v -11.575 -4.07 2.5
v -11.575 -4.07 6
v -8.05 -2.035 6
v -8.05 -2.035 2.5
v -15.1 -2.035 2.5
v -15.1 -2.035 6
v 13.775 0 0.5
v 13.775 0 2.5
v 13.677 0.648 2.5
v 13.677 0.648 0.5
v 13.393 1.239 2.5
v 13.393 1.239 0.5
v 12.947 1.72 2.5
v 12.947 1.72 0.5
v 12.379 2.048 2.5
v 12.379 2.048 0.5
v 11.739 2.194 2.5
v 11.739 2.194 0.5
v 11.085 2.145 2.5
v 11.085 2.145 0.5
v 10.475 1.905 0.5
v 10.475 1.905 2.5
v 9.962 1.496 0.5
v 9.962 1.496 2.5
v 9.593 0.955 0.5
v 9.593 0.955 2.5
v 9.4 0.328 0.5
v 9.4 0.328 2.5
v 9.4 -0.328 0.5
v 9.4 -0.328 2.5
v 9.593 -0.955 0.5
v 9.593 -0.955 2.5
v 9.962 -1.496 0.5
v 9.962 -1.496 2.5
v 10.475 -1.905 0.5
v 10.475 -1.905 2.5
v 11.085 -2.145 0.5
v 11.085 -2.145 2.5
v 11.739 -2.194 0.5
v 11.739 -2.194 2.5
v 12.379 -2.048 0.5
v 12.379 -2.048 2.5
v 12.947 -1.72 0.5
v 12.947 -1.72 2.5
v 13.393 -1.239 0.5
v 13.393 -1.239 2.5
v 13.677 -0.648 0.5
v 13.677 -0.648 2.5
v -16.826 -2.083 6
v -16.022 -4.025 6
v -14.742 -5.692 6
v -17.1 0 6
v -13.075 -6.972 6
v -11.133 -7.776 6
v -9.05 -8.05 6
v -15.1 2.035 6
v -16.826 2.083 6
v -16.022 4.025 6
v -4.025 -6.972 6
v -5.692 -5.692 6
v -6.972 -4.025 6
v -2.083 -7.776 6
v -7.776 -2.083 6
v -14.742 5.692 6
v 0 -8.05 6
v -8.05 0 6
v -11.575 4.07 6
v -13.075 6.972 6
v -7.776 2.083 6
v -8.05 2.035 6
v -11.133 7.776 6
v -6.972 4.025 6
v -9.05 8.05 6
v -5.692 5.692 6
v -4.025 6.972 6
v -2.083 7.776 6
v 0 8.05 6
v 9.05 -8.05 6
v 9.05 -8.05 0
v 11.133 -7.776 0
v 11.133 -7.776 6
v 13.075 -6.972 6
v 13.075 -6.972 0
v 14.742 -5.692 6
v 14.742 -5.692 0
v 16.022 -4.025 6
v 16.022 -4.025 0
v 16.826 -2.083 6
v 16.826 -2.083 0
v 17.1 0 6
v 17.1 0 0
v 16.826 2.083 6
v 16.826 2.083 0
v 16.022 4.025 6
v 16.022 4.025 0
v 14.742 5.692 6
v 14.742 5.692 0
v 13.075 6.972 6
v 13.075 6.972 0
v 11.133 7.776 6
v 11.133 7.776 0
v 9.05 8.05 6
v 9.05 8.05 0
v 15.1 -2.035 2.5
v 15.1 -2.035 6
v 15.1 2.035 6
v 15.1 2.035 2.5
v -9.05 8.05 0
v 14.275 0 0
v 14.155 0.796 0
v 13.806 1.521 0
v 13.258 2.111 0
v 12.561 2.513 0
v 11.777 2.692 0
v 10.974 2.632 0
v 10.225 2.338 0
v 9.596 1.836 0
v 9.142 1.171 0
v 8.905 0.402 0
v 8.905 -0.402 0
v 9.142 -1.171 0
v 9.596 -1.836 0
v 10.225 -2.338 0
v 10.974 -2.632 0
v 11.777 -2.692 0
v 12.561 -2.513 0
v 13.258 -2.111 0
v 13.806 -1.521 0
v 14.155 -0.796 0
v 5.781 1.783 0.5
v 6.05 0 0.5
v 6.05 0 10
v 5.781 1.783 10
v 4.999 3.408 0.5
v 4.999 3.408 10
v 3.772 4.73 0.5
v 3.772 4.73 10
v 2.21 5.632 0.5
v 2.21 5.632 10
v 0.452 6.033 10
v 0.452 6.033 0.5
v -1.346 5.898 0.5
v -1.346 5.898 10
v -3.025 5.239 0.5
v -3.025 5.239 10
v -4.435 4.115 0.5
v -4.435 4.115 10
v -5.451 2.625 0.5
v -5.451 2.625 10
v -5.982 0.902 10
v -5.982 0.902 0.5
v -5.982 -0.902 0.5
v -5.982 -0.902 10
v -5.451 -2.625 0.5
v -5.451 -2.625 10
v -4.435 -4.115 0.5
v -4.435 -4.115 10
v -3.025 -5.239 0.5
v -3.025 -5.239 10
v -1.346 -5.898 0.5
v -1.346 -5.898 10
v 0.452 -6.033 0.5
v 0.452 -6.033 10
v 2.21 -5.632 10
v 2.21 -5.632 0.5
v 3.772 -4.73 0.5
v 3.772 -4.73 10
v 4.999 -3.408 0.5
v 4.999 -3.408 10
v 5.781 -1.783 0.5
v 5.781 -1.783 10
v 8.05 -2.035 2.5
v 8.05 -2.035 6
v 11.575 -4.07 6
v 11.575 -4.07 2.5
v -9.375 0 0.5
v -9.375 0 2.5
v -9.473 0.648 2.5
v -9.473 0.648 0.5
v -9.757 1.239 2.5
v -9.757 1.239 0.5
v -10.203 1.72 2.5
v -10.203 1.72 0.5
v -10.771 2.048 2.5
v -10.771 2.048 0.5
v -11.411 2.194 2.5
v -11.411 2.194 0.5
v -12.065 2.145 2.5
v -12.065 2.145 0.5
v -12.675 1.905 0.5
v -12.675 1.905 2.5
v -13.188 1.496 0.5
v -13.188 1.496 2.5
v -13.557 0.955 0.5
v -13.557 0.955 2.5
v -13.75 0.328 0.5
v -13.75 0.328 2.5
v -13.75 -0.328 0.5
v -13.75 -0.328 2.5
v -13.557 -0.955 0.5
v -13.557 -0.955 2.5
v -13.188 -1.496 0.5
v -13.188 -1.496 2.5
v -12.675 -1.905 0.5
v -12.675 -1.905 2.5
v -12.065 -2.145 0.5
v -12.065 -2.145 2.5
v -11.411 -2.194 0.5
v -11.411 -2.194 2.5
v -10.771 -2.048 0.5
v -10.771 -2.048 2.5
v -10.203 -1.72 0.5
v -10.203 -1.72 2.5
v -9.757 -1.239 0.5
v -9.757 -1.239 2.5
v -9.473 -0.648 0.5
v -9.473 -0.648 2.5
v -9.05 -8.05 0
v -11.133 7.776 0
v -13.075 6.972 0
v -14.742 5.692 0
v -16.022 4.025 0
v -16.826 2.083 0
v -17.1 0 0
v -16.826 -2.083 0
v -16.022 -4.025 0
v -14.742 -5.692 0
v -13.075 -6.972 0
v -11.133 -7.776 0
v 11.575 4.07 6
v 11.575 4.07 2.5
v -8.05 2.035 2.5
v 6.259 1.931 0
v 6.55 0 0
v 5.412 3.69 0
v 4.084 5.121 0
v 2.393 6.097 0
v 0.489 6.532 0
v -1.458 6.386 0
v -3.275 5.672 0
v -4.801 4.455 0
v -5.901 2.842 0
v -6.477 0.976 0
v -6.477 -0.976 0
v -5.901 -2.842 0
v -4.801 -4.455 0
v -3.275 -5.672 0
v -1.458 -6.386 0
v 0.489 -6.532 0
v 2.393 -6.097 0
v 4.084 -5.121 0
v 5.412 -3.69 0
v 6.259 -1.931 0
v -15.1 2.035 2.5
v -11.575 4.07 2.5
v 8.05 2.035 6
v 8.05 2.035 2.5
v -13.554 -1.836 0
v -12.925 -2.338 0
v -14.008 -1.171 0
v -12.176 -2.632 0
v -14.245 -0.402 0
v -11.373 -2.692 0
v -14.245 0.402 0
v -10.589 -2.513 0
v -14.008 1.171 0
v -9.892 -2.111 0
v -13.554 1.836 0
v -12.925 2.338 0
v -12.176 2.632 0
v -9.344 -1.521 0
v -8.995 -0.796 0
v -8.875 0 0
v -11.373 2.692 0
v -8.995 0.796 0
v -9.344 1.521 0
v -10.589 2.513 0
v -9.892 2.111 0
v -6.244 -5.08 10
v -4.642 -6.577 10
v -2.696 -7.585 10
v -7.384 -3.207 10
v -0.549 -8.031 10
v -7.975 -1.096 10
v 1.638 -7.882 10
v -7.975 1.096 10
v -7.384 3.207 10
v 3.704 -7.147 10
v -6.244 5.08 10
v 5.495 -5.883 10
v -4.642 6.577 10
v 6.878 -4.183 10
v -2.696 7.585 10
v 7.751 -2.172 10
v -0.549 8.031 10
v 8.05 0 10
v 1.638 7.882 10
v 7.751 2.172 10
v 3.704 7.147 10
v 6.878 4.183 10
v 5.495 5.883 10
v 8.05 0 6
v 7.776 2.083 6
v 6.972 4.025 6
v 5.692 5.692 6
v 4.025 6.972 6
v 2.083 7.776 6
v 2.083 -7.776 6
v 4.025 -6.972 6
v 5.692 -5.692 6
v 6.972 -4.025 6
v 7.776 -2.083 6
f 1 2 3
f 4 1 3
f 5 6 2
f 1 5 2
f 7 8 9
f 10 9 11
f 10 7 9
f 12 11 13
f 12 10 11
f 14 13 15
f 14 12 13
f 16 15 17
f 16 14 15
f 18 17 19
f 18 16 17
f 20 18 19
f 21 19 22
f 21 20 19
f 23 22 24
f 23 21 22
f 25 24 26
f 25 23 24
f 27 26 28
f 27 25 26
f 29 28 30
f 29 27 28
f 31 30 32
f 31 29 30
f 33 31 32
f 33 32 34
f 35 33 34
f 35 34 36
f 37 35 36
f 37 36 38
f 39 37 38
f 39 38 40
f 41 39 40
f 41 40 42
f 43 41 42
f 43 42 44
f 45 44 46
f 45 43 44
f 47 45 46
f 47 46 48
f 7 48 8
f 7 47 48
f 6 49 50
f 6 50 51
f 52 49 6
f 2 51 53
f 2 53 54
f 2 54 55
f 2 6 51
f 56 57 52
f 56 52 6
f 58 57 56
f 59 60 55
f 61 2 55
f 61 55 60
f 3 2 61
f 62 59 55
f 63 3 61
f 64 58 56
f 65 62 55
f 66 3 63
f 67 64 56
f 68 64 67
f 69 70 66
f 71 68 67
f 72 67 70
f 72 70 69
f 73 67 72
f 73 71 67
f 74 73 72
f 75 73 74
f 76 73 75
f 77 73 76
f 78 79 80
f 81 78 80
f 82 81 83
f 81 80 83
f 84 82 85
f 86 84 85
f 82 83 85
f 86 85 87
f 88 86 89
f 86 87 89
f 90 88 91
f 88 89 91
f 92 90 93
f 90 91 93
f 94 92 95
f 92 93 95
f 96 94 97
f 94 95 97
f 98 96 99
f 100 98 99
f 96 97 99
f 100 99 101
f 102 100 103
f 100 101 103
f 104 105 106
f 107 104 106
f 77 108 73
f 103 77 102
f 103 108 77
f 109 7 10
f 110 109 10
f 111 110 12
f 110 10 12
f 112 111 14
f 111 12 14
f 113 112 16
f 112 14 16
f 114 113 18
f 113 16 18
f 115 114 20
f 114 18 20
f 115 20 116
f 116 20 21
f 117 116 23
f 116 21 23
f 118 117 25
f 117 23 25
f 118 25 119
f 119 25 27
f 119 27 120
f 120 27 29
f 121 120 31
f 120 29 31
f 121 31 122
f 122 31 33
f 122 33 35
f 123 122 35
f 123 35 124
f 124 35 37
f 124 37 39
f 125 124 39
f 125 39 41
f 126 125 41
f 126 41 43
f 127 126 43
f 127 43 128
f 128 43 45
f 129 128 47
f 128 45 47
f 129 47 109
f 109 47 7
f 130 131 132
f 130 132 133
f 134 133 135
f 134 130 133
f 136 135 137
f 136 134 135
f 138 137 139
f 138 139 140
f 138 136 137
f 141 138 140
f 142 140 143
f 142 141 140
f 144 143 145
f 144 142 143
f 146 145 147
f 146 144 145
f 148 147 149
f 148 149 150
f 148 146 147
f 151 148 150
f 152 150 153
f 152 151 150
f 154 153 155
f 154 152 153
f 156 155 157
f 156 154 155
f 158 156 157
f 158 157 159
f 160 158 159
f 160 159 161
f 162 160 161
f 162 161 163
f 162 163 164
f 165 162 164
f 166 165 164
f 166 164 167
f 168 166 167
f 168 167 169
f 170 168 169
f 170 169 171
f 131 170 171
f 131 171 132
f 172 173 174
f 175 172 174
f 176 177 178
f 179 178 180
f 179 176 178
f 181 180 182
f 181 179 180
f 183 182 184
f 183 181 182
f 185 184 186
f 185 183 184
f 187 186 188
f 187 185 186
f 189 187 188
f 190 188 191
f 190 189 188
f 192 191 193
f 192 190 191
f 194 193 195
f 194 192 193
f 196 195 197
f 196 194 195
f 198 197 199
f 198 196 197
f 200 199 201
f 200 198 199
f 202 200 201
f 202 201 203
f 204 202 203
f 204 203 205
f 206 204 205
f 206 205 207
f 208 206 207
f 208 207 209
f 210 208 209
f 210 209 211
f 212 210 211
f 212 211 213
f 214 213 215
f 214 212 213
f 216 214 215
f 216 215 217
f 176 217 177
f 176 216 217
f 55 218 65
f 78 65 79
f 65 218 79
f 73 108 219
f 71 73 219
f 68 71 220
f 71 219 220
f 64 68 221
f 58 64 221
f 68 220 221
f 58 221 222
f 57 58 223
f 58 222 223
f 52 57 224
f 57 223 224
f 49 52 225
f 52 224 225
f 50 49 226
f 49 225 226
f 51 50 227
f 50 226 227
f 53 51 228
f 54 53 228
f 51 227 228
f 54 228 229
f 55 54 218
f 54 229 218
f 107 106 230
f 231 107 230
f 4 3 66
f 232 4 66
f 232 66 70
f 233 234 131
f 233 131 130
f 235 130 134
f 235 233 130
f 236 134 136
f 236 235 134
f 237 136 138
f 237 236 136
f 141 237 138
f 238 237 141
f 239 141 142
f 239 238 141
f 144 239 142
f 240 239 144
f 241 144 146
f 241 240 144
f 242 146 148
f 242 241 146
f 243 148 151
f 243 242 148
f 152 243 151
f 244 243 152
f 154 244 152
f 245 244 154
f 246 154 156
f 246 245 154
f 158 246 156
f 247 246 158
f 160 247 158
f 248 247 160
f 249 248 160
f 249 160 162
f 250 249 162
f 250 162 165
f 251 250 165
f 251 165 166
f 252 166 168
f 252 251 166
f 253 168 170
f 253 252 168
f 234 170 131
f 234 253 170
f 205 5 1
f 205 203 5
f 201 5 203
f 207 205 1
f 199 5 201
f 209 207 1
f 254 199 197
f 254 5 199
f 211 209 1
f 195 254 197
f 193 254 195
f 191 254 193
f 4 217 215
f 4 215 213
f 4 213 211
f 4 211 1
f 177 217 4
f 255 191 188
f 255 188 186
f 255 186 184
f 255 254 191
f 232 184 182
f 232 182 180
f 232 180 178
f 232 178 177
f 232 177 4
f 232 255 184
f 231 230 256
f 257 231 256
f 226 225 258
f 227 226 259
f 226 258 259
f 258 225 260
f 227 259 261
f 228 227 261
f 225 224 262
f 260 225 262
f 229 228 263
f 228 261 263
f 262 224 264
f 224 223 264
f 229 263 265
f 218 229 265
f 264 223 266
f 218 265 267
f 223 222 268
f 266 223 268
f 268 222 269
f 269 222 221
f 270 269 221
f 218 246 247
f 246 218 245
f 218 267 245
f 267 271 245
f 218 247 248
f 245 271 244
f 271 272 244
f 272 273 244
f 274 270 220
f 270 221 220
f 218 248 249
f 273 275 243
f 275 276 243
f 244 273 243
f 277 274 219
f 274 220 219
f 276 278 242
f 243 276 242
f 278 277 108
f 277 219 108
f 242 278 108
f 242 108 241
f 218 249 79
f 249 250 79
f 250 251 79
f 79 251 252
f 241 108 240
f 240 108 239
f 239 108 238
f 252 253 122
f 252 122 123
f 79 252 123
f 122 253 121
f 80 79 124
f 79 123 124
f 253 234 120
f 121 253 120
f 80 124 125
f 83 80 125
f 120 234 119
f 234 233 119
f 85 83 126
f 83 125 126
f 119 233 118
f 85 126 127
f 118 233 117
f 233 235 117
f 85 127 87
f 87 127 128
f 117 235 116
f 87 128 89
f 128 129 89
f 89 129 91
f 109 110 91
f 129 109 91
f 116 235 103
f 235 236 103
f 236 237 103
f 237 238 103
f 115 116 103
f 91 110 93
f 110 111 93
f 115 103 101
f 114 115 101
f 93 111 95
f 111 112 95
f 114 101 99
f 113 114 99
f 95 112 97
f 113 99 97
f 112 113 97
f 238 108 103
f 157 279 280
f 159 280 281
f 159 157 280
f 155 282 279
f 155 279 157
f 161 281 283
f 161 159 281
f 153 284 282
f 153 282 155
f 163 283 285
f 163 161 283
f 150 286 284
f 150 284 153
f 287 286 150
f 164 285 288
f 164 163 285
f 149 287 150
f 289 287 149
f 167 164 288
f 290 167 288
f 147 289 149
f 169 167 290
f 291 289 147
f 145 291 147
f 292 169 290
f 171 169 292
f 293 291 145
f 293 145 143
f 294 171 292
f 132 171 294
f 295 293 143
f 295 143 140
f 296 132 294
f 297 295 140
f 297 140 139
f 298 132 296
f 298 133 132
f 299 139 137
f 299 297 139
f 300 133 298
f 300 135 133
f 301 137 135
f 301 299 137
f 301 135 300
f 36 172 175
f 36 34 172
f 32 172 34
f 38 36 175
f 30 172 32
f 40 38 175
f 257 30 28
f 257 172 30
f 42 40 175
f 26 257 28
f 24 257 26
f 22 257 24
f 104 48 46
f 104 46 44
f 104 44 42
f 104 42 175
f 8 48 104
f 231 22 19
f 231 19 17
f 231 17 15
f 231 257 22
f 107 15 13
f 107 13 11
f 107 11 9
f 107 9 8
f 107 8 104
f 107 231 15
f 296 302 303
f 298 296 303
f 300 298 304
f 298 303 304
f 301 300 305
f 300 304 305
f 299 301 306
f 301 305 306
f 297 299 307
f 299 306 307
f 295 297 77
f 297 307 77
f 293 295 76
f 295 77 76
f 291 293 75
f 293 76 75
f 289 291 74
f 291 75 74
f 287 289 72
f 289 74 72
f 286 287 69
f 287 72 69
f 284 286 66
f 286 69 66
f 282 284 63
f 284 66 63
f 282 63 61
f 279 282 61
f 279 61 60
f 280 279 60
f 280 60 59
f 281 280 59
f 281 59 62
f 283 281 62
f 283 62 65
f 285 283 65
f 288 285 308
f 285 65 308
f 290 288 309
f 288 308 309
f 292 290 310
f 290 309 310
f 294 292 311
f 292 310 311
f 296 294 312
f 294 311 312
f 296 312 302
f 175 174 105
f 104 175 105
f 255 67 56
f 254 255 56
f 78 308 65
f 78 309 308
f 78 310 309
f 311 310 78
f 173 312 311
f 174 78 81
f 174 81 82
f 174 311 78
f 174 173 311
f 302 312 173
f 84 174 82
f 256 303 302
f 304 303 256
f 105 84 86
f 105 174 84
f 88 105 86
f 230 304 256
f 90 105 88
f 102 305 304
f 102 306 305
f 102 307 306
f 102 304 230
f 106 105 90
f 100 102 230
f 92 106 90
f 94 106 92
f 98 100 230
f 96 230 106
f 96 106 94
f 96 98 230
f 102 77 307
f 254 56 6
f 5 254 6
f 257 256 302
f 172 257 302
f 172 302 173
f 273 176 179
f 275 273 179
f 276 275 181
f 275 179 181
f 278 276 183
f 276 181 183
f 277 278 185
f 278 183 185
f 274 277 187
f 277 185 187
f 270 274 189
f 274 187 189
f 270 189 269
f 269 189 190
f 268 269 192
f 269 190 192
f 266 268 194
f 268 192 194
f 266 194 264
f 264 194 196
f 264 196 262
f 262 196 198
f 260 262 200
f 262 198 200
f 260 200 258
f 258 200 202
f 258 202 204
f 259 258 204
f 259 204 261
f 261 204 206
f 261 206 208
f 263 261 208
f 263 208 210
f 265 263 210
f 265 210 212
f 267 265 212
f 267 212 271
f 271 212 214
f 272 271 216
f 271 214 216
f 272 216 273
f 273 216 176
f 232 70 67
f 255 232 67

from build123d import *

# Parameters (mm, degrees)
SKETCH_R      = 6.05
SKETCH_R_2    = 2.2
PAD_DEPTH     = 6
POCKET_DEPTH  = 3.5
SKETCH002_R   = 8.05
SKETCH002_R_2 = 6.05
PAD001_DEPTH  = 4
CHAMFER_SIZE  = 0.5


with BuildPart() as part:
    # Sketch → Pad (new body)
    with BuildSketch(Plane.XY):
        with BuildLine():
            ThreePointArc((-9.05, 8.05), (-17.1, 0), (-9.05, -8.05))
            Line((-9.05, -8.05), (9.05, -8.05))
            ThreePointArc((9.05, -8.05), (17.1, 0), (9.05, 8.05))
            Line((-9.05, 8.05), (9.05, 8.05))
        make_face()
        Circle(SKETCH_R, mode=Mode.SUBTRACT)
        with Locations((-11.575, 0)):
            Circle(SKETCH_R_2, mode=Mode.SUBTRACT)
        with Locations((11.575, 0)):
            Circle(SKETCH_R_2, mode=Mode.SUBTRACT)
    extrude(amount=PAD_DEPTH)

    # Sketch001 → Pocket (cut)
    with BuildSketch(Plane.XY.offset(6)):
        Polygon((-11.575, -4.070319), (-8.05, -2.03516), (-8.05, 2.03516), (-11.575, 4.070319), (-15.1, 2.03516), (-15.1, -2.03516), align=None)
        Polygon((11.575, -4.070319), (15.1, -2.03516), (15.1, 2.03516), (11.575, 4.070319), (8.05, 2.03516), (8.05, -2.03516), align=None)
    extrude(amount=-POCKET_DEPTH, mode=Mode.SUBTRACT)

    # Sketch002 → Pad001 (new body)
    with BuildSketch(Plane.XY.offset(6)):
        Circle(SKETCH002_R)
        Circle(SKETCH002_R_2, mode=Mode.SUBTRACT)
    extrude(amount=PAD001_DEPTH)

    # Chamfer
    chamfer_edges = [part.edges().sort_by_distance(p)[0] for p in [
        (-13.775, 0, 0),
        (-6.05, 0, 0),
        (9.375, 0, 0),
    ]]
    chamfer(chamfer_edges, length=CHAMFER_SIZE)


solid = part.part
